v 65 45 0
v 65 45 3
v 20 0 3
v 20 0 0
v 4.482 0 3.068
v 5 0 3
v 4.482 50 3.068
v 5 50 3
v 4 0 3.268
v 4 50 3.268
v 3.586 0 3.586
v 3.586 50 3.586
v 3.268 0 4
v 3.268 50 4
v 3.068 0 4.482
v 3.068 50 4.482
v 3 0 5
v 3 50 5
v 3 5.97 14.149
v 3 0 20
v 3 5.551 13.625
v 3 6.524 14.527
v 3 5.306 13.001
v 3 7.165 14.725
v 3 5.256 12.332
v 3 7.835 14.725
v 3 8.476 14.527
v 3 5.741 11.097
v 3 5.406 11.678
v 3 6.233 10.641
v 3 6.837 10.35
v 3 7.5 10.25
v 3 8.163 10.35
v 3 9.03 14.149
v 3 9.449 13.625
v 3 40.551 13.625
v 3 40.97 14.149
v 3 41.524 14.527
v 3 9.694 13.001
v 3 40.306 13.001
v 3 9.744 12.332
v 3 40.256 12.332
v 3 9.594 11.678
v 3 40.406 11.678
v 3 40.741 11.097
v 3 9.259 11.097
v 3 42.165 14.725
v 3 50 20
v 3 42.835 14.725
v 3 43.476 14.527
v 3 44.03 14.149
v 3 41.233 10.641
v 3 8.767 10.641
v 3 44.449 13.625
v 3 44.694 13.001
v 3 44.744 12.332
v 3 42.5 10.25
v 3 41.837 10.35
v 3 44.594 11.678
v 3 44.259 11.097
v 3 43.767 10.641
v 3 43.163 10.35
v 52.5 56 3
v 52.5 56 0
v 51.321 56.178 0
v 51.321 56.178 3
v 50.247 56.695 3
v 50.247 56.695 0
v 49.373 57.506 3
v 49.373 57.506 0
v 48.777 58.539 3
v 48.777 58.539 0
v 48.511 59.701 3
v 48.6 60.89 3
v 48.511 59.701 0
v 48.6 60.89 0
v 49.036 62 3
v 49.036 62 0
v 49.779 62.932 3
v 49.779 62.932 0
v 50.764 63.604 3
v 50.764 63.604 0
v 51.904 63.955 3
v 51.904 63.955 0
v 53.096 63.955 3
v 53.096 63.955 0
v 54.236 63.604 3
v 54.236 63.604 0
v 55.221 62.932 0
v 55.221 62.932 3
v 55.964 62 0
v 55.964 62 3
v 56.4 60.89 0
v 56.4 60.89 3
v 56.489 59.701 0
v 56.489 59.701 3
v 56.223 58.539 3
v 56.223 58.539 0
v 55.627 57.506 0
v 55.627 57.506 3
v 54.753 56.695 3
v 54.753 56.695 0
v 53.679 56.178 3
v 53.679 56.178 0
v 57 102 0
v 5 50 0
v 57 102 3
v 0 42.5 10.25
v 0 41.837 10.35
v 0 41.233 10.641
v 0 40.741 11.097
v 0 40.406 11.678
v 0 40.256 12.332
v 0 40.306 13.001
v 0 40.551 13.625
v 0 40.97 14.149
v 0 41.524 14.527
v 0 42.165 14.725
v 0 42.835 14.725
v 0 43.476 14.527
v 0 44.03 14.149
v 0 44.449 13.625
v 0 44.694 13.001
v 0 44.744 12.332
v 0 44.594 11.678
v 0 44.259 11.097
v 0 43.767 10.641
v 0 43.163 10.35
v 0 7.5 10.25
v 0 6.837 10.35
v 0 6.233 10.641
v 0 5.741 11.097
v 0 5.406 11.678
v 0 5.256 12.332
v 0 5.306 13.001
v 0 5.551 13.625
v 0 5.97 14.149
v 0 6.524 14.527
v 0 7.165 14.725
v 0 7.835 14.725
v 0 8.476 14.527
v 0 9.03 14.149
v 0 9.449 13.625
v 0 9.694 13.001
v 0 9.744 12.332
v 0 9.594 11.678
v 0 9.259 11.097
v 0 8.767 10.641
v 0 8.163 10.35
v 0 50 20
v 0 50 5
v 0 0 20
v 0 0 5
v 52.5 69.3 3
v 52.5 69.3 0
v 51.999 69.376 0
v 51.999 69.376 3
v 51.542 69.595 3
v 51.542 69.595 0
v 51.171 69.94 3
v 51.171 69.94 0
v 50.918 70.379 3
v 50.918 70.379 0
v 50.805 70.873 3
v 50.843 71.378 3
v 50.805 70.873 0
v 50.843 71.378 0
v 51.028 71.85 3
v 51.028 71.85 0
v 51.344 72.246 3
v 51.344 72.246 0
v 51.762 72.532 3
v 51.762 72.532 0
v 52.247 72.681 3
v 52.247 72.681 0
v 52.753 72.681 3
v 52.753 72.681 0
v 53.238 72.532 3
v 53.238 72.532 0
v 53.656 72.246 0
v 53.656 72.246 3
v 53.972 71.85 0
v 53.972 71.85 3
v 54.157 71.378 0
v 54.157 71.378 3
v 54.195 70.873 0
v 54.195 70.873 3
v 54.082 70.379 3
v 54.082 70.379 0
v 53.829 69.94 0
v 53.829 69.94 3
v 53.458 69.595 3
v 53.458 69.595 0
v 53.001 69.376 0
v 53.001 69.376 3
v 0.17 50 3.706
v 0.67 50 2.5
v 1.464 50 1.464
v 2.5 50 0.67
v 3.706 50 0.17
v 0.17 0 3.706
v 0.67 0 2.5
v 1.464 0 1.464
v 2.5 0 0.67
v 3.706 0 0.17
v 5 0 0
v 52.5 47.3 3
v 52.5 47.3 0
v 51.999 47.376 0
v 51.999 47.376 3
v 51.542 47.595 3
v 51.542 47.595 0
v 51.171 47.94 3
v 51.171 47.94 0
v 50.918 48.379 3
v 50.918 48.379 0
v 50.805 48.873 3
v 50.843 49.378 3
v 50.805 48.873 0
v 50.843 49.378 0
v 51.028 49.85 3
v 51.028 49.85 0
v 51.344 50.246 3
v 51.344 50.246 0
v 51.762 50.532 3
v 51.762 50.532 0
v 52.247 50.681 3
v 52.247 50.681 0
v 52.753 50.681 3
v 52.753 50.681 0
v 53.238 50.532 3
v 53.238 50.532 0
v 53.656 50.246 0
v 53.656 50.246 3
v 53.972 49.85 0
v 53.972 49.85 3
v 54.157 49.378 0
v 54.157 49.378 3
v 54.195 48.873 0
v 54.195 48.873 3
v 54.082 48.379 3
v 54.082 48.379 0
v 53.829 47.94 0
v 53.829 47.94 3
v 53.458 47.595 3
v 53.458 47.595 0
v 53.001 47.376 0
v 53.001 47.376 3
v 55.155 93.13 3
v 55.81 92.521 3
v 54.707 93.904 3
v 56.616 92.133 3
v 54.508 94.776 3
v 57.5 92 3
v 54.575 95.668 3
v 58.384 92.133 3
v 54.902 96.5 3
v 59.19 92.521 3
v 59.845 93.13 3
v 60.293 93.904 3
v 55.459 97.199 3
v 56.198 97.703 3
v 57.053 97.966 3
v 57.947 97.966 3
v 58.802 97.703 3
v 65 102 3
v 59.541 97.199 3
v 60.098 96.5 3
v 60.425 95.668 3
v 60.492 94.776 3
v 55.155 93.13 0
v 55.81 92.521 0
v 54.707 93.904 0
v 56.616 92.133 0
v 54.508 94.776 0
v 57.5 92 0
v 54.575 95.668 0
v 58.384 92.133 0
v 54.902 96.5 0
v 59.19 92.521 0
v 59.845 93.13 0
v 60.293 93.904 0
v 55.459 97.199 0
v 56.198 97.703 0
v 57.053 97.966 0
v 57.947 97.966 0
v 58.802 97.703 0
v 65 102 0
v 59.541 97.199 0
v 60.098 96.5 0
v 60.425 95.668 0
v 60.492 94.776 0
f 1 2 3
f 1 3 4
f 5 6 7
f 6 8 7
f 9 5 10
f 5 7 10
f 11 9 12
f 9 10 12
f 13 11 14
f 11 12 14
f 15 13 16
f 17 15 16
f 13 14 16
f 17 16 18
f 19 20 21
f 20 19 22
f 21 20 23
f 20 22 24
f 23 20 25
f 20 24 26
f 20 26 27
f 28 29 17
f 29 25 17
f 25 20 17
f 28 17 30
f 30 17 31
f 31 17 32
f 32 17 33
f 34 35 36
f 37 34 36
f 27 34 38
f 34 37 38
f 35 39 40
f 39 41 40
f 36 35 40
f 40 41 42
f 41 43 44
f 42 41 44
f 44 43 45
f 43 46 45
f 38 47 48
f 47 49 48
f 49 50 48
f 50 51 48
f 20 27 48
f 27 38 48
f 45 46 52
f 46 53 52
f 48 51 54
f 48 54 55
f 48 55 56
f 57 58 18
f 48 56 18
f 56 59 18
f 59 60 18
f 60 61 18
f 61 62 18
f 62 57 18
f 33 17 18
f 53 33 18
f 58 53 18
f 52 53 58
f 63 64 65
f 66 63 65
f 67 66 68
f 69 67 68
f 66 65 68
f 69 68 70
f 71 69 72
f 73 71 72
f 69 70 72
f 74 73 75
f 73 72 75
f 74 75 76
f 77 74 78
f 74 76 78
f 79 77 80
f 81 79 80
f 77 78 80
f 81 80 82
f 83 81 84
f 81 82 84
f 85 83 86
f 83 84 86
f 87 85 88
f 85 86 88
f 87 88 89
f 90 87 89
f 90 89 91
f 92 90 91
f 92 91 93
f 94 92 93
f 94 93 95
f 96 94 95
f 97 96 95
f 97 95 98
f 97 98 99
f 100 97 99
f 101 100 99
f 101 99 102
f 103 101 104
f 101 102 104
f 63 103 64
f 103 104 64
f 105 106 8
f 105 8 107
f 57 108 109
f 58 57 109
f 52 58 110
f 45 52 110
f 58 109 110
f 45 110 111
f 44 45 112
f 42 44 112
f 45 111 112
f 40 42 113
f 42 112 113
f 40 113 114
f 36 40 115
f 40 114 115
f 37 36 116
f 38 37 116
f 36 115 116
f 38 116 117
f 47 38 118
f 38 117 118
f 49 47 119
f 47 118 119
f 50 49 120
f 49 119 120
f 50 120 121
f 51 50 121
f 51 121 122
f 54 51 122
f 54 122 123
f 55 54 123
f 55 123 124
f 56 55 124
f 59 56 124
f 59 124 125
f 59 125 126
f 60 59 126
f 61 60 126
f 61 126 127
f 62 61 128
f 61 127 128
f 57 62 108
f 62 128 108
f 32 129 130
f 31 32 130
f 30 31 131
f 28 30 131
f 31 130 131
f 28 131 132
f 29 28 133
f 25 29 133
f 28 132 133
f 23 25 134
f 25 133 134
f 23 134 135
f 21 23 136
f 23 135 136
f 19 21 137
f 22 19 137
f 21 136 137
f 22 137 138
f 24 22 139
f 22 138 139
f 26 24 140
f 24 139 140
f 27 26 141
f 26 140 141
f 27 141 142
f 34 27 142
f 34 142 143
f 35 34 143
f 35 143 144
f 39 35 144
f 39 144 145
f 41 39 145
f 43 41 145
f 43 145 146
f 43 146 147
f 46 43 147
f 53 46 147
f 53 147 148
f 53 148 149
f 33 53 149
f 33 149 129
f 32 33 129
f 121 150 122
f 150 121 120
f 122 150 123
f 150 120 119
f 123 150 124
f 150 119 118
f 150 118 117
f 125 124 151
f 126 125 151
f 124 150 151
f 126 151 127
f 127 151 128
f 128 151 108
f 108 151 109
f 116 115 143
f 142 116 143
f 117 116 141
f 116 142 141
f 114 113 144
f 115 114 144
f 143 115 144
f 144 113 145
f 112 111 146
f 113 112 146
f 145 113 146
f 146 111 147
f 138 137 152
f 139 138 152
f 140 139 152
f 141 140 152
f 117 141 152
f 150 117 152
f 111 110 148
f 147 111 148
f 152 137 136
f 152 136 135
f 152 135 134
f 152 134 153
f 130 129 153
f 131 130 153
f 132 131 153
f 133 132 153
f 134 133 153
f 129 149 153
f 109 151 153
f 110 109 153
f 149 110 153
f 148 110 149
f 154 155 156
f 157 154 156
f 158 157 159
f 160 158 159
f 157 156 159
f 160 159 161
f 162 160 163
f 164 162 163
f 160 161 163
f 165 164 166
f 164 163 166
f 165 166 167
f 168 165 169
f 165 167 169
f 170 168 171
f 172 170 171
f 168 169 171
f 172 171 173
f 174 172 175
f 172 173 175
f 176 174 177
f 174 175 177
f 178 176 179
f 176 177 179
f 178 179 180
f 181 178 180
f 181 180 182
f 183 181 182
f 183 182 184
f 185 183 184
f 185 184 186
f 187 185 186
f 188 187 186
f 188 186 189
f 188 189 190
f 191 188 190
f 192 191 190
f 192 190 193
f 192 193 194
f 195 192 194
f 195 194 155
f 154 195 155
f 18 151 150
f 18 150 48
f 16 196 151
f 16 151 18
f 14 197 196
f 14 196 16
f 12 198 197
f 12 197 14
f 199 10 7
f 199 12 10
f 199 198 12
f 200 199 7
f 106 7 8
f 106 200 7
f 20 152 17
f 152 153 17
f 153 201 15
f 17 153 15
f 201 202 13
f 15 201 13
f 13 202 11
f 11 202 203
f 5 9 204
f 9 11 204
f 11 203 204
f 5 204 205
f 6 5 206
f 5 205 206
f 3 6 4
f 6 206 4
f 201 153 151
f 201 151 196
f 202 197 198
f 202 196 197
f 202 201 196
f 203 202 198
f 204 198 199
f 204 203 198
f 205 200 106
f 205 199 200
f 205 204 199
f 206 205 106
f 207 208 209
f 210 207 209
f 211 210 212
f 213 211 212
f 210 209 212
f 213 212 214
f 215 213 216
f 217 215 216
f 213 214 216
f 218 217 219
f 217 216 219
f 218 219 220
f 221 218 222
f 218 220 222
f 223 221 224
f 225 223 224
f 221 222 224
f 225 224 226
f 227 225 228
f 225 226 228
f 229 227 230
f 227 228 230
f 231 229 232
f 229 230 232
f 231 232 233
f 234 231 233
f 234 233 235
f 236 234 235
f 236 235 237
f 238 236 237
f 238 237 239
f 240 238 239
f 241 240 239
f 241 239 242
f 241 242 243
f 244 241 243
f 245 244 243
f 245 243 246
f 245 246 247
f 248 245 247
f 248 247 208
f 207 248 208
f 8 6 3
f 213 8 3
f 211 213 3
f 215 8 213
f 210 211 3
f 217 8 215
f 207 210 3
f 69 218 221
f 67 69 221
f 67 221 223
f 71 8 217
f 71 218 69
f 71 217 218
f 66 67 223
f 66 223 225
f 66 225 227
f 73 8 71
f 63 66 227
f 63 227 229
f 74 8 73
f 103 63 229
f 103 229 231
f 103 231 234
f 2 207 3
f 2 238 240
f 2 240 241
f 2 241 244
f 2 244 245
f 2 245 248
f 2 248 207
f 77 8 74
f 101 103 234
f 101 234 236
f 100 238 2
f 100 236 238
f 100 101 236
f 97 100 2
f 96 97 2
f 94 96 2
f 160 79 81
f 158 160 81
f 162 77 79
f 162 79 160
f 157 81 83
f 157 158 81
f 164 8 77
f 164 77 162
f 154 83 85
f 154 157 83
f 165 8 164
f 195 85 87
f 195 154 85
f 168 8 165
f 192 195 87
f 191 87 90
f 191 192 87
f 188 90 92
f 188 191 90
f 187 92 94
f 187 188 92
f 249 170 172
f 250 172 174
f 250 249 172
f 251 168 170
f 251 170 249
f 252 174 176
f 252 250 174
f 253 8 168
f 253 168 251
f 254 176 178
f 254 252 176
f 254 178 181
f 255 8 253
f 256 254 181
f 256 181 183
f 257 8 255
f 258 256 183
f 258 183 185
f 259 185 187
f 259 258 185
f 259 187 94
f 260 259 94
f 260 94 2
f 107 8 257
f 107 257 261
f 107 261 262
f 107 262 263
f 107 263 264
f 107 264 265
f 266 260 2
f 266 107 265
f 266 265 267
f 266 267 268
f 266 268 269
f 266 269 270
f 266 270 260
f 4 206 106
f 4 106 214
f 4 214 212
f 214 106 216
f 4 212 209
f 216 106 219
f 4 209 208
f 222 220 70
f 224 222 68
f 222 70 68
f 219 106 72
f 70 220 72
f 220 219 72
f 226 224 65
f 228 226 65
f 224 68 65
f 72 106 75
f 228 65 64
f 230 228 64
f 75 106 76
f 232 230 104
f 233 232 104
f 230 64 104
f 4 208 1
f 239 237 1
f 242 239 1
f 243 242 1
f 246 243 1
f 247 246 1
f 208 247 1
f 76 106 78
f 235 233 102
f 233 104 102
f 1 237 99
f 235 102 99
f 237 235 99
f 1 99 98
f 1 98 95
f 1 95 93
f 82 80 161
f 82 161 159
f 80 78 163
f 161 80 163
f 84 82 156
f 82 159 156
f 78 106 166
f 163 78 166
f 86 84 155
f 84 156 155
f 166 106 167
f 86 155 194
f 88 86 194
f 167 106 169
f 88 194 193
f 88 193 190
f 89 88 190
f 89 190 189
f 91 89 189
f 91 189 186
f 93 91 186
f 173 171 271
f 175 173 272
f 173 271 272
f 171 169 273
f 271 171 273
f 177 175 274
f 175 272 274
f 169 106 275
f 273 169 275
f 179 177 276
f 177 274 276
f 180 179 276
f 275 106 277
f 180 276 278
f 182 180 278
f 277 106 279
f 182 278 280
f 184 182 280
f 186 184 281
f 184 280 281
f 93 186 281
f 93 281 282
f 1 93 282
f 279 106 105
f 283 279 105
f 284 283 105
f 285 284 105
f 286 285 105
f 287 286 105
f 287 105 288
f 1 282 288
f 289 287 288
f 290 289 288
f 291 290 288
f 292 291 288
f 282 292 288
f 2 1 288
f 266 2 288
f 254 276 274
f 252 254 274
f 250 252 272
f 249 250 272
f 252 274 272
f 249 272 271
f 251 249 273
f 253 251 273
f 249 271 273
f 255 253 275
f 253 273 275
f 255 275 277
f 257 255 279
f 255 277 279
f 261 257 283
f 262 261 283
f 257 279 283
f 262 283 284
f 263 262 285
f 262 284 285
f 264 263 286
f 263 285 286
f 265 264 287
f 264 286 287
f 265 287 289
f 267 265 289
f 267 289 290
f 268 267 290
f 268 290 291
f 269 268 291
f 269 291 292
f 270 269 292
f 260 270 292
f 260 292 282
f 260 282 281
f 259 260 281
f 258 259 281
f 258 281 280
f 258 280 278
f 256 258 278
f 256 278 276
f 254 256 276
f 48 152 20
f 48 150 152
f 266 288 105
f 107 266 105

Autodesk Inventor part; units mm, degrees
ref_plane "YZ Plane" through (0, 0, 0) normal (1, 0, 0) x (0, 1, 0)
ref_plane "XZ Plane" through (0, 0, 0) normal (0, 1, 0) x (-1, 0, 0)
ref_plane "XY Plane" through (0, 0, 0) normal (0, 0, 1) x (1, 0, 0)
sketch "Sketch1" plane through (0, 0, 0) normal (0, 0, 1) x (1, 0, 0)
  line L0 (0, 0) -> (65, 0)
  line L1 (65, 0) -> (65, 102)
  line L2 (65, 102) -> (0, 102)
  line L3 (0, 102) -> (0, 0)
  line L4 (0, 50) -> (5, 50)
  line L5 (5, 50) -> (57, 102)
  dimension "d0" = 65
  dimension "d1" = 102
  dimension "d28" = 45
  dimension "d29" = 50
  dimension "d30" = 5
extrude "Extrusion1" add sketch "Sketch1" along normal blind 3 contours L3 L4 L5 L2 L1 L0
sketch "Sketch2" plane through (0, 0, 3) normal (0, 0, 1) x (1, 0, 0)
  line L0 (0, 0) -> (65, 0) projected
  line L1 (0, 0) -> (3, 0)
  line L2 (3, 0) -> (3, 50)
  line L3 (3, 50) -> (0, 50)
  line L4 (0, 50) -> (0, 0)
  dimension "d4" = 3
  dimension "d5" = 50
extrude "Extrusion2" add sketch "Sketch2" along normal blind 17
chamfer "Chamfer2" distance 45 angle 45 1 edges at (65, 0, 1.5)
sketch "Sketch4" plane through (3, 0, 3) normal (1, 0, 0) x (0, 0, -1)
  line L0 (-17, 0) -> (-17, 50) projected
  line L1 (0, 50) -> (-17, 50) projected
  line L2 (0, 0) -> (-17, 0) projected
  point P0 (3, 0)
  point P1 (-9.5, 42.5)
  point P2 (-9.5, 7.5)
  dimension "d31" = 7.5
  dimension "d32" = 7.5
  dimension "d33" = 7.5
  dimension "d34" = 35
hole "Hole1" at (3, 42.5, 12.5) at (3, 7.5, 12.5) direction (-1, 0, 0) diameter 4.5 end through all clearance for "Flat Head Machine Screw" size "M4" standard "Ansi Metric M Profile"
sketch "Sketch3" plane through (0, 0, 3) normal (0, 0, 1) x (1, 0, 0)
  line L0 (3, 0) -> (3, 50) projected
  line L1 (0, 50) -> (0, 0) projected
  line L2 (3, 50) -> (0, 50) projected
  point P0 (57.5, 95)
  dimension "d10" = 57.5
  dimension "d42" = 45
hole "Hole2" at (57.5, 95, 3) direction (0, 0, -1) diameter 6 end through all
sketch "Sketch5" plane through (0, 0, 3) normal (0, 0, 1) x (1, 0, 0)
  circle A0 centre (57.5, 95) radius 3 projected
  point P0 (0, 0)
  point P1 (52.5, 71)
  point P2 (52.5, 49)
  dimension "d51" = 22
  dimension "d70" = 24
  dimension "d71" = 5
hole "Hole3" at (52.5, 71, 3) at (52.5, 49, 3) direction (0, 0, -1) diameter 3.4 end through all clearance for "Flat Head Machine Screw" size "M3" standard "Ansi Metric M Profile"
fillet "Fillet5" radius 2 1 edges at (3, 25, 3)
fillet "Fillet6" radius 5 1 edges at (0, 25, 0)
sketch "Sketch6" plane through (0, 0, 3) normal (0, 0, 1) x (1, 0, 0)
  circle A0 centre (57.5, 95) radius 3 projected
  circle A1 centre (52.5, 71) radius 1.7 projected
  point P0 (0, 0)
  point P1 (52.5, 60)
  dimension "d69" = 11
hole "Hole4" at (52.5, 60, 3) direction (0, 0, -1) diameter 8 end through all
equation "\"d33\" = d32"
properties part number "Pancake_Bracket" material "Aluminum 6061"
